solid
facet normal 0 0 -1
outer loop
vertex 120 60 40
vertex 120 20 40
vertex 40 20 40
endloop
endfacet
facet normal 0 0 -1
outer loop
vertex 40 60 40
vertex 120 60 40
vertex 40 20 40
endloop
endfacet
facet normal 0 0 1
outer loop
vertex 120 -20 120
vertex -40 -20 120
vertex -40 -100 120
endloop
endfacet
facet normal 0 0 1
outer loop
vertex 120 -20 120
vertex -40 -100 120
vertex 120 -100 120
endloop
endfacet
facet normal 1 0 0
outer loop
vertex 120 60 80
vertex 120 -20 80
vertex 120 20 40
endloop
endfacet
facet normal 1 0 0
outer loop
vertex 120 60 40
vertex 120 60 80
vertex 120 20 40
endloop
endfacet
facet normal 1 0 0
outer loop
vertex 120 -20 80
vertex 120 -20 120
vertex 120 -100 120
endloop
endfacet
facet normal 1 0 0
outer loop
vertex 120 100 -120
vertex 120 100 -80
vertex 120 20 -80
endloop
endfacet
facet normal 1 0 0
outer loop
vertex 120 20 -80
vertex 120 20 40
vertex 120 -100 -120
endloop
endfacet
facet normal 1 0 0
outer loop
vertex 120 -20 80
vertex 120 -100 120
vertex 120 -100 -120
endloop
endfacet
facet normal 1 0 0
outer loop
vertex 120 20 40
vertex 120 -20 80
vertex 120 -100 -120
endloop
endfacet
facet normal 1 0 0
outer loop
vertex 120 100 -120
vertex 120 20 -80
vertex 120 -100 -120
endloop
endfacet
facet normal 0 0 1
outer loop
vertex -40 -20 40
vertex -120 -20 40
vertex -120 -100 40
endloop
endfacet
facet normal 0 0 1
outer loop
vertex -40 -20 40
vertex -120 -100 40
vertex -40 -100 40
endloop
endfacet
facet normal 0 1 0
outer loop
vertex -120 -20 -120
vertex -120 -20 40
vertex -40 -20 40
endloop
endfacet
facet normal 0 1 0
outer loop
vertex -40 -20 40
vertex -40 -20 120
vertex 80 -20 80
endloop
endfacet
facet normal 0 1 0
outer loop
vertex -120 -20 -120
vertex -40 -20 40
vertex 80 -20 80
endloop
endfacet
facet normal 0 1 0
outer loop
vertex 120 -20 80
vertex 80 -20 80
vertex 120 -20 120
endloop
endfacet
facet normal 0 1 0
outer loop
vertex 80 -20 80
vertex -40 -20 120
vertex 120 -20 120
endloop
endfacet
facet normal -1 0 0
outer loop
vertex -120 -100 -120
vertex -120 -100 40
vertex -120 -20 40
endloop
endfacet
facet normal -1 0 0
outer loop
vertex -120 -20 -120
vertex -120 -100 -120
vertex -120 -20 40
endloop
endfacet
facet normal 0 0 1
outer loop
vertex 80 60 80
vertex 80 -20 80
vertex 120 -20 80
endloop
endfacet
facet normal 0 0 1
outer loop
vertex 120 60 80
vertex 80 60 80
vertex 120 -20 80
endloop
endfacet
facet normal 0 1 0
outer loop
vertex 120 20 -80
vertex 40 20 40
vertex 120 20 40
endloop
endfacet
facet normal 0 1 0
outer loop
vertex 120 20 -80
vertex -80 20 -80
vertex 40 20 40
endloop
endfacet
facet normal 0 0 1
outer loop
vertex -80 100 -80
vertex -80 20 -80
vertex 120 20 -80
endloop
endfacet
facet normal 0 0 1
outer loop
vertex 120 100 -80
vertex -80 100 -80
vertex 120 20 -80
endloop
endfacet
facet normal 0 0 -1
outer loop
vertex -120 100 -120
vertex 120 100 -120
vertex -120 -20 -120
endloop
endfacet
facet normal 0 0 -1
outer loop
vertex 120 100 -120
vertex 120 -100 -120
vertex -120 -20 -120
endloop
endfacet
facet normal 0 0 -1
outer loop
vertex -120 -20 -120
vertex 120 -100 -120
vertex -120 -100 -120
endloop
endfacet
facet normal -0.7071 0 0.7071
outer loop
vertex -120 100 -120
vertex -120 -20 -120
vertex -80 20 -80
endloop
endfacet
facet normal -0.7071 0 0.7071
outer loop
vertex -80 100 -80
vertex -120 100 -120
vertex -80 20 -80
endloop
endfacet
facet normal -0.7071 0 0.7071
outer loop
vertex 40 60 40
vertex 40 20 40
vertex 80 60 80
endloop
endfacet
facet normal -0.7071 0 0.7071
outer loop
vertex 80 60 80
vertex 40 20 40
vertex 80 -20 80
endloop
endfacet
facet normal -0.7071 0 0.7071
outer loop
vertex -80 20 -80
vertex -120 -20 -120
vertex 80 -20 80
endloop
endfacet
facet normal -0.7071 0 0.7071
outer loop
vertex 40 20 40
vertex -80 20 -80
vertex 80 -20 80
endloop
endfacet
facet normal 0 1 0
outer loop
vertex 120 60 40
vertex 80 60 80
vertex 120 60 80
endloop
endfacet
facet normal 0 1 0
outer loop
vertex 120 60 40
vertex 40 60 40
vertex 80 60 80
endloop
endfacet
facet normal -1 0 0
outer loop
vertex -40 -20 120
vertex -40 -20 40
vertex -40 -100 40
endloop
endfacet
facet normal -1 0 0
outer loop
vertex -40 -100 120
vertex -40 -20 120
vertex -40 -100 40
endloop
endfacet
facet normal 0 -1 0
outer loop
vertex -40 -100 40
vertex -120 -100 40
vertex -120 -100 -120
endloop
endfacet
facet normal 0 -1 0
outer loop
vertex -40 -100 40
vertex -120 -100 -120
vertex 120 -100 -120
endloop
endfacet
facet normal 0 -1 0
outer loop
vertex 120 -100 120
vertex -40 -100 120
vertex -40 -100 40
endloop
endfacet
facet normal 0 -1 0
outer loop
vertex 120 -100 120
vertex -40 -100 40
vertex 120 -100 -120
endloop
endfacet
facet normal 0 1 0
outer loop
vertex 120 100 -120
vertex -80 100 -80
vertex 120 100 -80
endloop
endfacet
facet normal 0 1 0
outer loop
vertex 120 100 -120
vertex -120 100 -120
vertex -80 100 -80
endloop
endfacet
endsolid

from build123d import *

# Parameters (mm, degrees)
BOSS_EXTRUDE1_DEPTH = 120
SKETCH1_3_W         = 80
SKETCH1_3_H         = 80
BOSS_EXTRUDE2_DEPTH = 40
BOSS_EXTRUDE3_DEPTH = 120
SKETCH1_5_W         = 80
SKETCH1_5_H         = 80
BOSS_EXTRUDE4_DEPTH = 120
BOSS_EXTRUDE7_DEPTH = 80
BOSS_EXTRUDE8_DEPTH = 120
BOSS_EXTRUDE9_DEPTH = 40


with BuildPart() as part:
    # Sketch1 → Boss-Extrude1 (new body)
    with BuildSketch(Plane.XY):
        Polygon((120, -100), (120, -20), (80, -20), (-40, -20), (-40, -100), align=None)
    extrude(amount=BOSS_EXTRUDE1_DEPTH)

    # Sketch1<3> → Boss-Extrude2 (add)
    with BuildSketch(Plane.XY):
        with Locations((-80, -60)):
            Rectangle(SKETCH1_3_W, SKETCH1_3_H)
    extrude(amount=BOSS_EXTRUDE2_DEPTH)

    # Sketch1<4> → Boss-Extrude3 (add)
    with BuildSketch(Plane.XY):
        Polygon((120, -100), (120, -20), (80, -20), (-40, -20), (-40, -100), align=None)
    extrude(amount=-BOSS_EXTRUDE3_DEPTH)

    # Sketch1<5> → Boss-Extrude4 (add)
    with BuildSketch(Plane.XY):
        with Locations((-80, -60)):
            Rectangle(SKETCH1_5_W, SKETCH1_5_H)
    extrude(amount=-BOSS_EXTRUDE4_DEPTH)

    # Sketch4 → Boss-Extrude7 (add)
    with BuildSketch(Plane(origin=(0, -20, 0), x_dir=(1, 0, 0), z_dir=(0, 1, 0))):
        Polygon((80, -80), (120, -80), (120, -40), (40, -40), align=None)
    extrude(amount=BOSS_EXTRUDE7_DEPTH)

    # Sketch4<3> → Boss-Extrude8 (add)
    with BuildSketch(Plane(origin=(0, -20, 0), x_dir=(1, 0, 0), z_dir=(0, 1, 0))):
        Polygon((-80, 80), (120, 80), (120, 120), (-120, 120), align=None)
    extrude(amount=BOSS_EXTRUDE8_DEPTH)

    # Sketch4<4> → Boss-Extrude9 (add)
    with BuildSketch(Plane(origin=(0, -20, 0), x_dir=(1, 0, 0), z_dir=(0, 1, 0))):
        Polygon((40, -40), (120, -40), (120, 80), (-80, 80), align=None)
    extrude(amount=BOSS_EXTRUDE9_DEPTH)


solid = part.part
